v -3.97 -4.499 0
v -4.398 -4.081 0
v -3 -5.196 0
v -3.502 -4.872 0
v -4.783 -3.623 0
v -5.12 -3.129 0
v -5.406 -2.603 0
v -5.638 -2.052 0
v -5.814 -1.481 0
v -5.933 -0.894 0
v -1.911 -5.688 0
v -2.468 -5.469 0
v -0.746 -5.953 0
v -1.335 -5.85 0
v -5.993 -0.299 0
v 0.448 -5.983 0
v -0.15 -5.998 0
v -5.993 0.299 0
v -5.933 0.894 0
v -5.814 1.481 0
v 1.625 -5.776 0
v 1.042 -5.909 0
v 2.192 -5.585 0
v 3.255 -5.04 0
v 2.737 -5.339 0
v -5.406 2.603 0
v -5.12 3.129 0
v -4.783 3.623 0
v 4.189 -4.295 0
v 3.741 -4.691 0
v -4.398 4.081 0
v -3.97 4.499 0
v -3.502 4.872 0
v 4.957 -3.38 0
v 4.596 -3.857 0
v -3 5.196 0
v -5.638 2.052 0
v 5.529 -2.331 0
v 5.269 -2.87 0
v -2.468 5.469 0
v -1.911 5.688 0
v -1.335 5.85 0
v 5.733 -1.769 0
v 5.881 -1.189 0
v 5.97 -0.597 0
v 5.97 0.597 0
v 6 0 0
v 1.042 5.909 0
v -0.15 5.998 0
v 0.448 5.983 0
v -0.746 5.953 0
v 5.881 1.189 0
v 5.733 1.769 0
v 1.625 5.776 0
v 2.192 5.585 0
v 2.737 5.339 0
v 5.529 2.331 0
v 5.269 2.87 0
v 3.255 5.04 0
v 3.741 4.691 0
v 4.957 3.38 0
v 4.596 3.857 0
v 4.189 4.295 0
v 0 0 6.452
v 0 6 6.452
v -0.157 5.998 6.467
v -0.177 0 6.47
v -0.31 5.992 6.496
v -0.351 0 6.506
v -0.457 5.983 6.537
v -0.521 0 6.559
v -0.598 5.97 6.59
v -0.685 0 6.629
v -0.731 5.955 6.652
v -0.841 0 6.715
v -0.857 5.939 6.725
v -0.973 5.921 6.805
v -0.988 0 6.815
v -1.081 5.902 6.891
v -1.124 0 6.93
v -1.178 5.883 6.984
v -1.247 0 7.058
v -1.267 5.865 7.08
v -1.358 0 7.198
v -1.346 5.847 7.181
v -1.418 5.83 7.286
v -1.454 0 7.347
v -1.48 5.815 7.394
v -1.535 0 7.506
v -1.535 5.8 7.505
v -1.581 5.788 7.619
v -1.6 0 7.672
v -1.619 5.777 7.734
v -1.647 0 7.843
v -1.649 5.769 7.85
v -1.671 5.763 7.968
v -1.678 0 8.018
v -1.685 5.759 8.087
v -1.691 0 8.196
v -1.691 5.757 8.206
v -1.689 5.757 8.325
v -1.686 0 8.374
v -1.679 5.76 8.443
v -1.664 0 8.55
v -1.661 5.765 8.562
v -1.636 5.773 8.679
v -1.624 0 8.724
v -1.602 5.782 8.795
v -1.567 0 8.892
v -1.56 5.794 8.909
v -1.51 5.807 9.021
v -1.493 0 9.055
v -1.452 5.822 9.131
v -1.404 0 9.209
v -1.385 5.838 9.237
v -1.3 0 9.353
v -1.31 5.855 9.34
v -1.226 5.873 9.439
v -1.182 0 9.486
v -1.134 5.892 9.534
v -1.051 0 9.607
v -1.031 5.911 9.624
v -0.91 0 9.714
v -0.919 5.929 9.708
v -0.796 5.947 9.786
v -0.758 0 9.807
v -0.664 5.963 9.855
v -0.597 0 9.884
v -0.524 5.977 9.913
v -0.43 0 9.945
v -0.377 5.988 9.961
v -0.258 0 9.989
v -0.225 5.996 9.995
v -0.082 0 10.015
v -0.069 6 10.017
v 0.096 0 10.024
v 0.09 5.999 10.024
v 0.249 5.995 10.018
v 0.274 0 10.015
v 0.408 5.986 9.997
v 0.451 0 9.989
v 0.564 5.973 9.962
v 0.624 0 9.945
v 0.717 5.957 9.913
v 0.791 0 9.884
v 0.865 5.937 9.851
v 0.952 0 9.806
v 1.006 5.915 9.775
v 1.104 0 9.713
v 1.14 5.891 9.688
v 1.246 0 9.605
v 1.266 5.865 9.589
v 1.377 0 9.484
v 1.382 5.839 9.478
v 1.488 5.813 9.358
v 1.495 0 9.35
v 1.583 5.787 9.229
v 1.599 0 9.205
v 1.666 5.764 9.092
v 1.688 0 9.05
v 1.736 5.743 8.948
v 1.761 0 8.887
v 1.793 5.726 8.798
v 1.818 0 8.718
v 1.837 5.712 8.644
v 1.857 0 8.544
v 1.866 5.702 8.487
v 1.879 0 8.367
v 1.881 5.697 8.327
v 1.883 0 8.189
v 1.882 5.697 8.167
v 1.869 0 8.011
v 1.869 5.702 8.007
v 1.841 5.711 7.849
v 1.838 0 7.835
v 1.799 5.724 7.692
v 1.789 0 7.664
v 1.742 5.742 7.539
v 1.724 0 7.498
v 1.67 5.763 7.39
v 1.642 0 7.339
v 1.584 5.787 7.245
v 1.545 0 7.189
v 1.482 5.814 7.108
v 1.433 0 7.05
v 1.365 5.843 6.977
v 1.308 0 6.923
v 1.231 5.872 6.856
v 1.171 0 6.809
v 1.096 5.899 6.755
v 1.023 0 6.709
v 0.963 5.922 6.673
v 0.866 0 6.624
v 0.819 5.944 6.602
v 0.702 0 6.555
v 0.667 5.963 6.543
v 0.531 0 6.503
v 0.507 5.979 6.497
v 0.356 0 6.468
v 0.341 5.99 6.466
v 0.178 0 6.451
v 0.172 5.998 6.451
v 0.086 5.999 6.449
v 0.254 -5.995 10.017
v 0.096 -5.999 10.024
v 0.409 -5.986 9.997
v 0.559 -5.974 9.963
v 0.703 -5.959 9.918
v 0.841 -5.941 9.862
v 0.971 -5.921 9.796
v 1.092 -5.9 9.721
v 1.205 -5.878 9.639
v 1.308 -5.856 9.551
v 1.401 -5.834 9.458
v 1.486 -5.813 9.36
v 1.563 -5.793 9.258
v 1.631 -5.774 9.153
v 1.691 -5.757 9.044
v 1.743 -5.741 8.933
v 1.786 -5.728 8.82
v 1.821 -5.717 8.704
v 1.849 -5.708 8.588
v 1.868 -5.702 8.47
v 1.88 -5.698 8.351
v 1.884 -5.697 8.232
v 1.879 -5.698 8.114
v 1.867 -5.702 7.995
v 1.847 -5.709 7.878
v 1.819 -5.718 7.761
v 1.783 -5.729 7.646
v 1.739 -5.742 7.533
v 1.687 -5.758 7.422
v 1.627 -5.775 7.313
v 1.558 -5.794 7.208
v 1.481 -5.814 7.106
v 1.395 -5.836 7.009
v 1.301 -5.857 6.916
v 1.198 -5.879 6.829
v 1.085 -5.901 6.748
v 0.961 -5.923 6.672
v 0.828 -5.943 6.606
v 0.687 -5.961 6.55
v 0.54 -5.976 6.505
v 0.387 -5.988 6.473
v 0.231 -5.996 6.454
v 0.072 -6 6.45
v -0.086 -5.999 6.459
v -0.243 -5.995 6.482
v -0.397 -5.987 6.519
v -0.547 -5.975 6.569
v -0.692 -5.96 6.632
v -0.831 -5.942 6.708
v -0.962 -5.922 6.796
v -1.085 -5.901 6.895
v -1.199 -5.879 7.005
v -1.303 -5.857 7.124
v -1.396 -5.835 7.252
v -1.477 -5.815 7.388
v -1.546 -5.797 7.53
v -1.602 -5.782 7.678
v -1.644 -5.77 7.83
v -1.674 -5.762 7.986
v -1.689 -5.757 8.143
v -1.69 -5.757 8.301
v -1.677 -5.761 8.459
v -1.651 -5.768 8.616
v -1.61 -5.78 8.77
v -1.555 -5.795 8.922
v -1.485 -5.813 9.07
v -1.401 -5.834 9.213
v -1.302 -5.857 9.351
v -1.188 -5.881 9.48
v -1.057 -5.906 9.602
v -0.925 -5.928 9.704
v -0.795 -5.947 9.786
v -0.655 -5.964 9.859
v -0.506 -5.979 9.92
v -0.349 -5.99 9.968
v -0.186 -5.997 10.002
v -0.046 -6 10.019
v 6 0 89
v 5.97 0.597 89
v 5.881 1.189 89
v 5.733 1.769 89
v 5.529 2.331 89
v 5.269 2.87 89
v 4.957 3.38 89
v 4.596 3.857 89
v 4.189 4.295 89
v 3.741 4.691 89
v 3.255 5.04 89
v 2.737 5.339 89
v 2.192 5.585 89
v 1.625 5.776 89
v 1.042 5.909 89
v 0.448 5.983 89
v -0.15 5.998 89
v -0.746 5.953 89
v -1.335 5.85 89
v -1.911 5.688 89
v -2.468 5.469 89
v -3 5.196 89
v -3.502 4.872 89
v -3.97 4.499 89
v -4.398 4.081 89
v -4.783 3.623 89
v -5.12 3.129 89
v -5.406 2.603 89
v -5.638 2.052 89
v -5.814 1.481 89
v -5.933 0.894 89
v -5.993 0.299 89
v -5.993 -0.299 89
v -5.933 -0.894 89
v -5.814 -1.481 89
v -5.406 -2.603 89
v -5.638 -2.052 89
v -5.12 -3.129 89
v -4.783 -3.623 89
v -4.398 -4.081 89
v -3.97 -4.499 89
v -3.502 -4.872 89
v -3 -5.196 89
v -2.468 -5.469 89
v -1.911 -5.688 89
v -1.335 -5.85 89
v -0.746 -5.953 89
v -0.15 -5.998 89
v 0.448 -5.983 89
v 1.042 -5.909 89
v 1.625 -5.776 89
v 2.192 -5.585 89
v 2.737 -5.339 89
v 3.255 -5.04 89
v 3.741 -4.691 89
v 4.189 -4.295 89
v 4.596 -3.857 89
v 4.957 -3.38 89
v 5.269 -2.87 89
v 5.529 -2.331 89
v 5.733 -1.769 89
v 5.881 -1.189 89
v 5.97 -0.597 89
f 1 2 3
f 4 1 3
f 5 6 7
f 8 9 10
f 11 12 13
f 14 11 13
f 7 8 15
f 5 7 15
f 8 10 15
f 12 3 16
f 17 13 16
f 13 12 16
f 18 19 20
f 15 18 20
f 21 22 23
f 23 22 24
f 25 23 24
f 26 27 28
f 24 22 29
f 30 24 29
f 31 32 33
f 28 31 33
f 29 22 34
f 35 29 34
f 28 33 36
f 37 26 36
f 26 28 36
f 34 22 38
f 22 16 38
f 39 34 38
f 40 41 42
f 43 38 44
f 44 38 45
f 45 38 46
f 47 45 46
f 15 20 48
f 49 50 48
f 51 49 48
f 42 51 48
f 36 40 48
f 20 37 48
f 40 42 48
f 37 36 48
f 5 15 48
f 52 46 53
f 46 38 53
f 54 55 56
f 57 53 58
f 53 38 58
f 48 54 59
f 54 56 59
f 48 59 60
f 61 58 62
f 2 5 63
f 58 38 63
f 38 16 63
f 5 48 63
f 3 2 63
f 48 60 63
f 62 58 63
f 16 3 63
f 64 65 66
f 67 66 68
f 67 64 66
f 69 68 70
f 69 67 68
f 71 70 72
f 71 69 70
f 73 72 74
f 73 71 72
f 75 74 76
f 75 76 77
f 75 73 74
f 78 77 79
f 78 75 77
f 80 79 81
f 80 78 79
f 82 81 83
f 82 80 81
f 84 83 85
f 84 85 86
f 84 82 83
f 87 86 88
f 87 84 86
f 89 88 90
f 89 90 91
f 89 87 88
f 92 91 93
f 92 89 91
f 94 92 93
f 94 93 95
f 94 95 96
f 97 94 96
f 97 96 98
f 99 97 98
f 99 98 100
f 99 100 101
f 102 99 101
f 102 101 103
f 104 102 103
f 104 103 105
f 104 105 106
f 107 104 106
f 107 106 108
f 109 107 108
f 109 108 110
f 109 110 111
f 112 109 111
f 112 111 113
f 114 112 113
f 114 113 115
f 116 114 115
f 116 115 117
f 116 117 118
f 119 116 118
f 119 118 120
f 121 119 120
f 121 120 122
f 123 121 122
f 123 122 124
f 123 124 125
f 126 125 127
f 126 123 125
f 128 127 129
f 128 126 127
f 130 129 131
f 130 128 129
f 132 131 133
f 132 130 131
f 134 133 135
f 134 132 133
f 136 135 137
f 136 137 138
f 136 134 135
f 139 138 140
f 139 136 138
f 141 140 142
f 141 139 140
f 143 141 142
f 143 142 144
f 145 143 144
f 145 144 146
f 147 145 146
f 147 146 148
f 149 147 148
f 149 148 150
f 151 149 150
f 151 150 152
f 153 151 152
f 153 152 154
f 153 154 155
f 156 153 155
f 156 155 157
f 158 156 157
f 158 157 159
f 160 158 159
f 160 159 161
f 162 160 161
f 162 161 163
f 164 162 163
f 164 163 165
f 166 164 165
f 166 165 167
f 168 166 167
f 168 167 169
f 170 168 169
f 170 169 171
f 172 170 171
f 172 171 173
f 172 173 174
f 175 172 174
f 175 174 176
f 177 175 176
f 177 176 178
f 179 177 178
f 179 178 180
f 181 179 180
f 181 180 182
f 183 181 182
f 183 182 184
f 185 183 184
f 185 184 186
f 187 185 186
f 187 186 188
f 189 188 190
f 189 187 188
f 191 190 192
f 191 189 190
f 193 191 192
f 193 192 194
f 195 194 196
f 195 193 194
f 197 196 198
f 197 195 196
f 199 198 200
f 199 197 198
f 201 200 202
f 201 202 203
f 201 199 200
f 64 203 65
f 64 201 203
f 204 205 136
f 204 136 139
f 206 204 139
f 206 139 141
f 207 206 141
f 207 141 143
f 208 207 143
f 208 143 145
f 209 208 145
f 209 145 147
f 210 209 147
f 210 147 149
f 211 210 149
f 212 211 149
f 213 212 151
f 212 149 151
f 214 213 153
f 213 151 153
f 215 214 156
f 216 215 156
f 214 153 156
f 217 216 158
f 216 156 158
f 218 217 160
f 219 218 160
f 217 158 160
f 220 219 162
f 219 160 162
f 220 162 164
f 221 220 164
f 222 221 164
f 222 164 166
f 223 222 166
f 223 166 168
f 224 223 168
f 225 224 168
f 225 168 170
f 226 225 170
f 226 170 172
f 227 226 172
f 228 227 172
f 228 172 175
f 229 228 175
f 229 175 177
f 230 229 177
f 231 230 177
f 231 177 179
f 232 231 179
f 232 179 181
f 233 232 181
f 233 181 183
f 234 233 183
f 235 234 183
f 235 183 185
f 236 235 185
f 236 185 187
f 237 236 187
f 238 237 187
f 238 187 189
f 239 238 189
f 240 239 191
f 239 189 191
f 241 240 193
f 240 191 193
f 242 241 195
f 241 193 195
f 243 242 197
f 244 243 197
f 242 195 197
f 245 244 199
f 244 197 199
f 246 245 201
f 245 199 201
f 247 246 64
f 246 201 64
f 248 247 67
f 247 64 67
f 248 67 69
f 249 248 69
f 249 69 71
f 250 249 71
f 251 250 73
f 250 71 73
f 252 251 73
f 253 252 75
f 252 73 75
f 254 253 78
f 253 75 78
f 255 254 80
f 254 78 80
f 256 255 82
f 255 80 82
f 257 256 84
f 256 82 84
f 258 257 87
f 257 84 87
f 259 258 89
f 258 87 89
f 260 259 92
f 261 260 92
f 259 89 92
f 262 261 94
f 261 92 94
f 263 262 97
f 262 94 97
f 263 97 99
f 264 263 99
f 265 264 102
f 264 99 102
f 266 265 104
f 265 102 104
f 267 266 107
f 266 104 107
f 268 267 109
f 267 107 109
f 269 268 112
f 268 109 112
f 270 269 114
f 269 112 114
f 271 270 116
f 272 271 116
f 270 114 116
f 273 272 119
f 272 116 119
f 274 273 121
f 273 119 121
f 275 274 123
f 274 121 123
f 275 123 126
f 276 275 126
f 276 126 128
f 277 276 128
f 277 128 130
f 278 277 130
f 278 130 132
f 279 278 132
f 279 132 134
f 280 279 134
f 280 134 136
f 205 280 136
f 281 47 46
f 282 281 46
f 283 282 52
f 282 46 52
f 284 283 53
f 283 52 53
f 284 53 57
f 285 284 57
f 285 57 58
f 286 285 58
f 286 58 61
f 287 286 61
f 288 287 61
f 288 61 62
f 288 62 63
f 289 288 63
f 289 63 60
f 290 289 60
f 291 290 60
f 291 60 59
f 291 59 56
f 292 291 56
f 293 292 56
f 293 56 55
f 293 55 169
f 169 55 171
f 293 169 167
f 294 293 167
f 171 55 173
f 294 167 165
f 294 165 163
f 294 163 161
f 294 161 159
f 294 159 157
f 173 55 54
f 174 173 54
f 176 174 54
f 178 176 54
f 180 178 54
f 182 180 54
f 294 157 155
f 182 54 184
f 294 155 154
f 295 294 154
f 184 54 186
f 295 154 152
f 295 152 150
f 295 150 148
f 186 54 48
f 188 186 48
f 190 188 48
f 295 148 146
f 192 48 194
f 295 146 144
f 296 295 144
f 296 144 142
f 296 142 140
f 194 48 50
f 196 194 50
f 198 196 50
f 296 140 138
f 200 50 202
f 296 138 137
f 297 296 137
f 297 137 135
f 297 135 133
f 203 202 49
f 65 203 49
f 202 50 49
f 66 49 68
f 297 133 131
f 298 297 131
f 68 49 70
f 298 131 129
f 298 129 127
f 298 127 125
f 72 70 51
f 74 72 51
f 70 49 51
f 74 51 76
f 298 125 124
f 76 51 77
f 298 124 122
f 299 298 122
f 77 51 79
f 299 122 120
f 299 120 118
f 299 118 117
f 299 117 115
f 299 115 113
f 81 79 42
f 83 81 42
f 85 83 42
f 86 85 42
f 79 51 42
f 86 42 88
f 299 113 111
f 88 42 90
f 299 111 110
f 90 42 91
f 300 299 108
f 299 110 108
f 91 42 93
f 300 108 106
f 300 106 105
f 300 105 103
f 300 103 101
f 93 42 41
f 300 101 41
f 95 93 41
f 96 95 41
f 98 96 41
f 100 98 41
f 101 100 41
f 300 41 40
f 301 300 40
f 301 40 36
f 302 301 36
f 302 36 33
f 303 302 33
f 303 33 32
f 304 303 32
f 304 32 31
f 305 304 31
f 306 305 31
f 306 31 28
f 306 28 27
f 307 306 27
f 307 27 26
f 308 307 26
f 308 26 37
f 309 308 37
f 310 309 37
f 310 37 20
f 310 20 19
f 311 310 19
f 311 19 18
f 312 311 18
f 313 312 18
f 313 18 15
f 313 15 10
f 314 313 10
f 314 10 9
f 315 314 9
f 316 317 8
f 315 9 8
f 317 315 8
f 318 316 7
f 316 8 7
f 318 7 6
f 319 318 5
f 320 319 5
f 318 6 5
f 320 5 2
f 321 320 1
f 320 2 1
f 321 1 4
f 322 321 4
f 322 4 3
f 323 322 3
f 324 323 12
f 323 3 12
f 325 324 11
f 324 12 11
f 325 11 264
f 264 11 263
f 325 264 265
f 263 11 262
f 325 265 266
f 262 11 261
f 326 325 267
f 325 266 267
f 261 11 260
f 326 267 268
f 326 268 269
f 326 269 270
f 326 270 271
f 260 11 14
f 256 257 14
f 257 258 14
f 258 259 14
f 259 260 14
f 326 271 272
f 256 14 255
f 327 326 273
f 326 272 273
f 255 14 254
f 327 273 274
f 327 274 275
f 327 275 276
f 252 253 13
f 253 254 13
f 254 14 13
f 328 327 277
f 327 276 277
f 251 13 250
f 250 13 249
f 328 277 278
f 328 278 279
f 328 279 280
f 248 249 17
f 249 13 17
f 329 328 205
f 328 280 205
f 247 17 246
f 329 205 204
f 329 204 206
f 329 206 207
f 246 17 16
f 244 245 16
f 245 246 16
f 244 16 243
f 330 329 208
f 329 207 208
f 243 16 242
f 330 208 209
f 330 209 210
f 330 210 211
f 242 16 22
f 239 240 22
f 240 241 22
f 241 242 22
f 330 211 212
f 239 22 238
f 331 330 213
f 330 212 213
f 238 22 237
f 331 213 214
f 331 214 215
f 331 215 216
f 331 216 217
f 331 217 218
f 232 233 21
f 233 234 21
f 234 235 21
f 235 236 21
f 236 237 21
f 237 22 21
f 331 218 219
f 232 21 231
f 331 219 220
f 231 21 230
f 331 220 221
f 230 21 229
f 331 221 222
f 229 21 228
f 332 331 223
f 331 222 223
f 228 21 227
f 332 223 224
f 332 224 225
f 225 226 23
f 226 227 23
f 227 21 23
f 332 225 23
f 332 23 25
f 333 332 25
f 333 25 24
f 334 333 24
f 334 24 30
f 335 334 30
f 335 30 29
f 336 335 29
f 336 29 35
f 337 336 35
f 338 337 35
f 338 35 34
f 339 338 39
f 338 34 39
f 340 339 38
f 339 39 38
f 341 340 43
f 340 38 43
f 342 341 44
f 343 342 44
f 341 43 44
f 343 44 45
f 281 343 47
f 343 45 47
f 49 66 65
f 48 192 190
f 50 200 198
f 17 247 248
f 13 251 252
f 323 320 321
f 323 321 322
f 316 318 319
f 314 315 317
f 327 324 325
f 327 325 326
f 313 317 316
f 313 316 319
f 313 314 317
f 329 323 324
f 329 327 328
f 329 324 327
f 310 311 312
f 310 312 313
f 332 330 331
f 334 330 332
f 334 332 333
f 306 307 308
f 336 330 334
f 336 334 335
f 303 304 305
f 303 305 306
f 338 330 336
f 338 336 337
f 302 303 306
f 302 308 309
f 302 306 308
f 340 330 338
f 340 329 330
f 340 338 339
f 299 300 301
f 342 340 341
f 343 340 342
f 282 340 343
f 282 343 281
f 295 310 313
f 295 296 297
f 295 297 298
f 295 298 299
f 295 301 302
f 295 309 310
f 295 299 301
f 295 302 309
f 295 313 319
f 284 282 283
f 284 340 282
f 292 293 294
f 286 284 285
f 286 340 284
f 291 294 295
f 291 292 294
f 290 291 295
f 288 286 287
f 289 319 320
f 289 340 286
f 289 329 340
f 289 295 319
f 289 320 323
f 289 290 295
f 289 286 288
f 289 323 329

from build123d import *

# Parameters (mm, degrees)
SKETCH3_R           = 6
BOSS_EXTRUDE1_DEPTH = 89
SKETCH4_R           = 1.787461207
SKETCH4_R_2         = 2
CUT_EXTRUDE1_DEPTH  = 90.403579347
SKETCH4_2_R         = 1.787461207
SKETCH4_2_R_2       = 2
CUT_EXTRUDE2_DEPTH  = 90.403579462


with BuildPart() as part:
    # Sketch3 → Boss-Extrude1 (new body)
    with BuildSketch(Plane.XY):
        Circle(SKETCH3_R)
    extrude(amount=BOSS_EXTRUDE1_DEPTH)

    # Sketch4 → Cut-Extrude1 (cut, through all)
    with BuildSketch(Plane(origin=(0, 0, 0), x_dir=(1, 0, 0), z_dir=(0, 1, 0))):
        with Locations((0.096225649, -8.236803081)):
            Circle(SKETCH4_R)
        with Locations((0, -123.236762823)):
            Circle(SKETCH4_R_2)
    extrude(amount=-CUT_EXTRUDE1_DEPTH, mode=Mode.SUBTRACT)

    # Sketch4<2> → Cut-Extrude2 (cut, through all)
    with BuildSketch(Plane(origin=(0, 0, 0), x_dir=(1, 0, 0), z_dir=(0, 1, 0))):
        with Locations((0.096225649, -8.236803081)):
            Circle(SKETCH4_2_R)
        with Locations((0, -123.236762823)):
            Circle(SKETCH4_2_R_2)
    extrude(amount=CUT_EXTRUDE2_DEPTH, mode=Mode.SUBTRACT)


solid = part.part
